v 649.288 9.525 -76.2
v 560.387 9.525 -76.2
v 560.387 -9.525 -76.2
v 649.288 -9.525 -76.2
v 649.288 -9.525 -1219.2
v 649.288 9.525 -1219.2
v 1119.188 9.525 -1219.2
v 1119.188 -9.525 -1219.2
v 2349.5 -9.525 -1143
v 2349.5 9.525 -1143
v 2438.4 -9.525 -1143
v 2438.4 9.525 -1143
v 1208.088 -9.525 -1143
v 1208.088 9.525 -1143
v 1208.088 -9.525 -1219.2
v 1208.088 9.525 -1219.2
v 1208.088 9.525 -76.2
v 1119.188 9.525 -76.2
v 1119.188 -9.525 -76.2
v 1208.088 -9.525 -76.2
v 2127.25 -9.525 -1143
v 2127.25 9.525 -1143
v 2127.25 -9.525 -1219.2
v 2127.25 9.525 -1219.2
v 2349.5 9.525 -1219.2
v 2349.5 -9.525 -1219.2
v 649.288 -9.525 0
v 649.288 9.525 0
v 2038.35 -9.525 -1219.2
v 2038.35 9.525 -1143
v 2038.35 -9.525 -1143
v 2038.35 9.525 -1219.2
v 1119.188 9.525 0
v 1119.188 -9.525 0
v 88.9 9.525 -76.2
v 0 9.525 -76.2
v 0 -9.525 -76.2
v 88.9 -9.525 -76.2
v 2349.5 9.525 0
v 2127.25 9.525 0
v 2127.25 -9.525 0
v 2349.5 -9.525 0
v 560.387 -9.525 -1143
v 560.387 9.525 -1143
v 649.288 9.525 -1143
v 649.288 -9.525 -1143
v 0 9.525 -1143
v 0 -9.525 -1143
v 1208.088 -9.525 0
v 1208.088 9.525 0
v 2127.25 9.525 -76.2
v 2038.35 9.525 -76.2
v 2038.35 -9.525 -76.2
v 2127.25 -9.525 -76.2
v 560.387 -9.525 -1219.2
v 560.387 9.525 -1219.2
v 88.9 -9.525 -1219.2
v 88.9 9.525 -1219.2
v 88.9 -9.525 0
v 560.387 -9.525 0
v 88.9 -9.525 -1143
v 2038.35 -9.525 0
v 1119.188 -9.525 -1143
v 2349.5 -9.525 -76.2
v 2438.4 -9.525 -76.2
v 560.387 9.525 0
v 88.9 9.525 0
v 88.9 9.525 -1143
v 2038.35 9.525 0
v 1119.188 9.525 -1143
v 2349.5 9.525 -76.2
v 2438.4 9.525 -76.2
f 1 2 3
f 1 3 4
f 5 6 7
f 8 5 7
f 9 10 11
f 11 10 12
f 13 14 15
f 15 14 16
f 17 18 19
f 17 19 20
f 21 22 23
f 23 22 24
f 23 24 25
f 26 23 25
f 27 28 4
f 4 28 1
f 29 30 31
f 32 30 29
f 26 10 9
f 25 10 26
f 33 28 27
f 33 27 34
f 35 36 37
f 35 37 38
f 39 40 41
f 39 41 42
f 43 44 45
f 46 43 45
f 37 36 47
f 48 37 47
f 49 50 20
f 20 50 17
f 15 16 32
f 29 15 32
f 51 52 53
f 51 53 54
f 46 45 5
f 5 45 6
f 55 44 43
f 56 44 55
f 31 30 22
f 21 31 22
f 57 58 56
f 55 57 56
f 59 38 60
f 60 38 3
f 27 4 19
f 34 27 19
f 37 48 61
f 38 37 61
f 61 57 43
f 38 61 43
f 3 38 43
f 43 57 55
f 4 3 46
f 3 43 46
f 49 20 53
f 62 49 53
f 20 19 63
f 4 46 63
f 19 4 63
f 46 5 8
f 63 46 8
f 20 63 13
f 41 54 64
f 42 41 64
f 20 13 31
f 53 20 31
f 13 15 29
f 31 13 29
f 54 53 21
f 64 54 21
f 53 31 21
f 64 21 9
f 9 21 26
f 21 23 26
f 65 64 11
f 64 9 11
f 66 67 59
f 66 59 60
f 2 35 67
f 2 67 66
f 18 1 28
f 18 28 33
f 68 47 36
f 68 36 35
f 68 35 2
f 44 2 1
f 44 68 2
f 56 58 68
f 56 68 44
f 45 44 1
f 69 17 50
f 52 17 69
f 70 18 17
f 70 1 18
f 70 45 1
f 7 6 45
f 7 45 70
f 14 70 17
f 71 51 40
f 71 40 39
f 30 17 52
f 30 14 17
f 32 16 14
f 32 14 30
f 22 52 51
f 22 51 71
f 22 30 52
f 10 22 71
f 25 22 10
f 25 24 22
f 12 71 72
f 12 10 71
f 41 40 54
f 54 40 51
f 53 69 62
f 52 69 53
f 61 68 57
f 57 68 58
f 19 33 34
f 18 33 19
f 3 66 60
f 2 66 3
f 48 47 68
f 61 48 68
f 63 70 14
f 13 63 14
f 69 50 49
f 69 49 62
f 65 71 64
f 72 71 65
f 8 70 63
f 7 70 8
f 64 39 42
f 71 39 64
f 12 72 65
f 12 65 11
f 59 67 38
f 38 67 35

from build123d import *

# Parameters (mm, degrees)
SKETCH1_W           = 2438.4
SKETCH1_H           = 1219.2
BOSS_EXTRUDE1_DEPTH = 9.525
SKETCH2_W           = 88.9
SKETCH2_H           = 76.2
CUT_EXTRUDE1_DEPTH  = 20.05


with BuildPart() as part:
    # Sketch1 → Boss-Extrude1 (new body, symmetric)
    with BuildSketch(Plane(origin=(0, 0, 0), x_dir=(1, 0, 0), z_dir=(0, 1, 0))):
        with Locations((1219.2, 609.6)):
            Rectangle(SKETCH1_W, SKETCH1_H)
    extrude(amount=BOSS_EXTRUDE1_DEPTH, both=True)

    # Sketch2 → Cut-Extrude1 (cut, through all)
    with BuildSketch(Plane(origin=(0, 9.525, 0), x_dir=(1, 0, 0), z_dir=(0, 1, 0))):
        with Locations((44.45, 1181.1)):
            Rectangle(SKETCH2_W, SKETCH2_H)
        with Locations((604.8375, 1181.1)):
            Rectangle(SKETCH2_W, SKETCH2_H)
        with Locations((1163.6375, 1181.1)):
            Rectangle(SKETCH2_W, SKETCH2_H)
        with Locations((2082.8, 1181.1)):
            Rectangle(SKETCH2_W, SKETCH2_H)
        with Locations((2393.95, 1181.1)):
            Rectangle(SKETCH2_W, SKETCH2_H)
        with Locations((1163.6375, 38.1)):
            Rectangle(SKETCH2_W, SKETCH2_H)
        with Locations((604.8375, 38.1)):
            Rectangle(SKETCH2_W, SKETCH2_H)
        with Locations((2393.95, 38.1)):
            Rectangle(SKETCH2_W, SKETCH2_H)
        with Locations((2082.8, 38.1)):
            Rectangle(SKETCH2_W, SKETCH2_H)
        with Locations((44.45, 38.1)):
            Rectangle(SKETCH2_W, SKETCH2_H)
    extrude(amount=-CUT_EXTRUDE1_DEPTH, mode=Mode.SUBTRACT)


solid = part.part
